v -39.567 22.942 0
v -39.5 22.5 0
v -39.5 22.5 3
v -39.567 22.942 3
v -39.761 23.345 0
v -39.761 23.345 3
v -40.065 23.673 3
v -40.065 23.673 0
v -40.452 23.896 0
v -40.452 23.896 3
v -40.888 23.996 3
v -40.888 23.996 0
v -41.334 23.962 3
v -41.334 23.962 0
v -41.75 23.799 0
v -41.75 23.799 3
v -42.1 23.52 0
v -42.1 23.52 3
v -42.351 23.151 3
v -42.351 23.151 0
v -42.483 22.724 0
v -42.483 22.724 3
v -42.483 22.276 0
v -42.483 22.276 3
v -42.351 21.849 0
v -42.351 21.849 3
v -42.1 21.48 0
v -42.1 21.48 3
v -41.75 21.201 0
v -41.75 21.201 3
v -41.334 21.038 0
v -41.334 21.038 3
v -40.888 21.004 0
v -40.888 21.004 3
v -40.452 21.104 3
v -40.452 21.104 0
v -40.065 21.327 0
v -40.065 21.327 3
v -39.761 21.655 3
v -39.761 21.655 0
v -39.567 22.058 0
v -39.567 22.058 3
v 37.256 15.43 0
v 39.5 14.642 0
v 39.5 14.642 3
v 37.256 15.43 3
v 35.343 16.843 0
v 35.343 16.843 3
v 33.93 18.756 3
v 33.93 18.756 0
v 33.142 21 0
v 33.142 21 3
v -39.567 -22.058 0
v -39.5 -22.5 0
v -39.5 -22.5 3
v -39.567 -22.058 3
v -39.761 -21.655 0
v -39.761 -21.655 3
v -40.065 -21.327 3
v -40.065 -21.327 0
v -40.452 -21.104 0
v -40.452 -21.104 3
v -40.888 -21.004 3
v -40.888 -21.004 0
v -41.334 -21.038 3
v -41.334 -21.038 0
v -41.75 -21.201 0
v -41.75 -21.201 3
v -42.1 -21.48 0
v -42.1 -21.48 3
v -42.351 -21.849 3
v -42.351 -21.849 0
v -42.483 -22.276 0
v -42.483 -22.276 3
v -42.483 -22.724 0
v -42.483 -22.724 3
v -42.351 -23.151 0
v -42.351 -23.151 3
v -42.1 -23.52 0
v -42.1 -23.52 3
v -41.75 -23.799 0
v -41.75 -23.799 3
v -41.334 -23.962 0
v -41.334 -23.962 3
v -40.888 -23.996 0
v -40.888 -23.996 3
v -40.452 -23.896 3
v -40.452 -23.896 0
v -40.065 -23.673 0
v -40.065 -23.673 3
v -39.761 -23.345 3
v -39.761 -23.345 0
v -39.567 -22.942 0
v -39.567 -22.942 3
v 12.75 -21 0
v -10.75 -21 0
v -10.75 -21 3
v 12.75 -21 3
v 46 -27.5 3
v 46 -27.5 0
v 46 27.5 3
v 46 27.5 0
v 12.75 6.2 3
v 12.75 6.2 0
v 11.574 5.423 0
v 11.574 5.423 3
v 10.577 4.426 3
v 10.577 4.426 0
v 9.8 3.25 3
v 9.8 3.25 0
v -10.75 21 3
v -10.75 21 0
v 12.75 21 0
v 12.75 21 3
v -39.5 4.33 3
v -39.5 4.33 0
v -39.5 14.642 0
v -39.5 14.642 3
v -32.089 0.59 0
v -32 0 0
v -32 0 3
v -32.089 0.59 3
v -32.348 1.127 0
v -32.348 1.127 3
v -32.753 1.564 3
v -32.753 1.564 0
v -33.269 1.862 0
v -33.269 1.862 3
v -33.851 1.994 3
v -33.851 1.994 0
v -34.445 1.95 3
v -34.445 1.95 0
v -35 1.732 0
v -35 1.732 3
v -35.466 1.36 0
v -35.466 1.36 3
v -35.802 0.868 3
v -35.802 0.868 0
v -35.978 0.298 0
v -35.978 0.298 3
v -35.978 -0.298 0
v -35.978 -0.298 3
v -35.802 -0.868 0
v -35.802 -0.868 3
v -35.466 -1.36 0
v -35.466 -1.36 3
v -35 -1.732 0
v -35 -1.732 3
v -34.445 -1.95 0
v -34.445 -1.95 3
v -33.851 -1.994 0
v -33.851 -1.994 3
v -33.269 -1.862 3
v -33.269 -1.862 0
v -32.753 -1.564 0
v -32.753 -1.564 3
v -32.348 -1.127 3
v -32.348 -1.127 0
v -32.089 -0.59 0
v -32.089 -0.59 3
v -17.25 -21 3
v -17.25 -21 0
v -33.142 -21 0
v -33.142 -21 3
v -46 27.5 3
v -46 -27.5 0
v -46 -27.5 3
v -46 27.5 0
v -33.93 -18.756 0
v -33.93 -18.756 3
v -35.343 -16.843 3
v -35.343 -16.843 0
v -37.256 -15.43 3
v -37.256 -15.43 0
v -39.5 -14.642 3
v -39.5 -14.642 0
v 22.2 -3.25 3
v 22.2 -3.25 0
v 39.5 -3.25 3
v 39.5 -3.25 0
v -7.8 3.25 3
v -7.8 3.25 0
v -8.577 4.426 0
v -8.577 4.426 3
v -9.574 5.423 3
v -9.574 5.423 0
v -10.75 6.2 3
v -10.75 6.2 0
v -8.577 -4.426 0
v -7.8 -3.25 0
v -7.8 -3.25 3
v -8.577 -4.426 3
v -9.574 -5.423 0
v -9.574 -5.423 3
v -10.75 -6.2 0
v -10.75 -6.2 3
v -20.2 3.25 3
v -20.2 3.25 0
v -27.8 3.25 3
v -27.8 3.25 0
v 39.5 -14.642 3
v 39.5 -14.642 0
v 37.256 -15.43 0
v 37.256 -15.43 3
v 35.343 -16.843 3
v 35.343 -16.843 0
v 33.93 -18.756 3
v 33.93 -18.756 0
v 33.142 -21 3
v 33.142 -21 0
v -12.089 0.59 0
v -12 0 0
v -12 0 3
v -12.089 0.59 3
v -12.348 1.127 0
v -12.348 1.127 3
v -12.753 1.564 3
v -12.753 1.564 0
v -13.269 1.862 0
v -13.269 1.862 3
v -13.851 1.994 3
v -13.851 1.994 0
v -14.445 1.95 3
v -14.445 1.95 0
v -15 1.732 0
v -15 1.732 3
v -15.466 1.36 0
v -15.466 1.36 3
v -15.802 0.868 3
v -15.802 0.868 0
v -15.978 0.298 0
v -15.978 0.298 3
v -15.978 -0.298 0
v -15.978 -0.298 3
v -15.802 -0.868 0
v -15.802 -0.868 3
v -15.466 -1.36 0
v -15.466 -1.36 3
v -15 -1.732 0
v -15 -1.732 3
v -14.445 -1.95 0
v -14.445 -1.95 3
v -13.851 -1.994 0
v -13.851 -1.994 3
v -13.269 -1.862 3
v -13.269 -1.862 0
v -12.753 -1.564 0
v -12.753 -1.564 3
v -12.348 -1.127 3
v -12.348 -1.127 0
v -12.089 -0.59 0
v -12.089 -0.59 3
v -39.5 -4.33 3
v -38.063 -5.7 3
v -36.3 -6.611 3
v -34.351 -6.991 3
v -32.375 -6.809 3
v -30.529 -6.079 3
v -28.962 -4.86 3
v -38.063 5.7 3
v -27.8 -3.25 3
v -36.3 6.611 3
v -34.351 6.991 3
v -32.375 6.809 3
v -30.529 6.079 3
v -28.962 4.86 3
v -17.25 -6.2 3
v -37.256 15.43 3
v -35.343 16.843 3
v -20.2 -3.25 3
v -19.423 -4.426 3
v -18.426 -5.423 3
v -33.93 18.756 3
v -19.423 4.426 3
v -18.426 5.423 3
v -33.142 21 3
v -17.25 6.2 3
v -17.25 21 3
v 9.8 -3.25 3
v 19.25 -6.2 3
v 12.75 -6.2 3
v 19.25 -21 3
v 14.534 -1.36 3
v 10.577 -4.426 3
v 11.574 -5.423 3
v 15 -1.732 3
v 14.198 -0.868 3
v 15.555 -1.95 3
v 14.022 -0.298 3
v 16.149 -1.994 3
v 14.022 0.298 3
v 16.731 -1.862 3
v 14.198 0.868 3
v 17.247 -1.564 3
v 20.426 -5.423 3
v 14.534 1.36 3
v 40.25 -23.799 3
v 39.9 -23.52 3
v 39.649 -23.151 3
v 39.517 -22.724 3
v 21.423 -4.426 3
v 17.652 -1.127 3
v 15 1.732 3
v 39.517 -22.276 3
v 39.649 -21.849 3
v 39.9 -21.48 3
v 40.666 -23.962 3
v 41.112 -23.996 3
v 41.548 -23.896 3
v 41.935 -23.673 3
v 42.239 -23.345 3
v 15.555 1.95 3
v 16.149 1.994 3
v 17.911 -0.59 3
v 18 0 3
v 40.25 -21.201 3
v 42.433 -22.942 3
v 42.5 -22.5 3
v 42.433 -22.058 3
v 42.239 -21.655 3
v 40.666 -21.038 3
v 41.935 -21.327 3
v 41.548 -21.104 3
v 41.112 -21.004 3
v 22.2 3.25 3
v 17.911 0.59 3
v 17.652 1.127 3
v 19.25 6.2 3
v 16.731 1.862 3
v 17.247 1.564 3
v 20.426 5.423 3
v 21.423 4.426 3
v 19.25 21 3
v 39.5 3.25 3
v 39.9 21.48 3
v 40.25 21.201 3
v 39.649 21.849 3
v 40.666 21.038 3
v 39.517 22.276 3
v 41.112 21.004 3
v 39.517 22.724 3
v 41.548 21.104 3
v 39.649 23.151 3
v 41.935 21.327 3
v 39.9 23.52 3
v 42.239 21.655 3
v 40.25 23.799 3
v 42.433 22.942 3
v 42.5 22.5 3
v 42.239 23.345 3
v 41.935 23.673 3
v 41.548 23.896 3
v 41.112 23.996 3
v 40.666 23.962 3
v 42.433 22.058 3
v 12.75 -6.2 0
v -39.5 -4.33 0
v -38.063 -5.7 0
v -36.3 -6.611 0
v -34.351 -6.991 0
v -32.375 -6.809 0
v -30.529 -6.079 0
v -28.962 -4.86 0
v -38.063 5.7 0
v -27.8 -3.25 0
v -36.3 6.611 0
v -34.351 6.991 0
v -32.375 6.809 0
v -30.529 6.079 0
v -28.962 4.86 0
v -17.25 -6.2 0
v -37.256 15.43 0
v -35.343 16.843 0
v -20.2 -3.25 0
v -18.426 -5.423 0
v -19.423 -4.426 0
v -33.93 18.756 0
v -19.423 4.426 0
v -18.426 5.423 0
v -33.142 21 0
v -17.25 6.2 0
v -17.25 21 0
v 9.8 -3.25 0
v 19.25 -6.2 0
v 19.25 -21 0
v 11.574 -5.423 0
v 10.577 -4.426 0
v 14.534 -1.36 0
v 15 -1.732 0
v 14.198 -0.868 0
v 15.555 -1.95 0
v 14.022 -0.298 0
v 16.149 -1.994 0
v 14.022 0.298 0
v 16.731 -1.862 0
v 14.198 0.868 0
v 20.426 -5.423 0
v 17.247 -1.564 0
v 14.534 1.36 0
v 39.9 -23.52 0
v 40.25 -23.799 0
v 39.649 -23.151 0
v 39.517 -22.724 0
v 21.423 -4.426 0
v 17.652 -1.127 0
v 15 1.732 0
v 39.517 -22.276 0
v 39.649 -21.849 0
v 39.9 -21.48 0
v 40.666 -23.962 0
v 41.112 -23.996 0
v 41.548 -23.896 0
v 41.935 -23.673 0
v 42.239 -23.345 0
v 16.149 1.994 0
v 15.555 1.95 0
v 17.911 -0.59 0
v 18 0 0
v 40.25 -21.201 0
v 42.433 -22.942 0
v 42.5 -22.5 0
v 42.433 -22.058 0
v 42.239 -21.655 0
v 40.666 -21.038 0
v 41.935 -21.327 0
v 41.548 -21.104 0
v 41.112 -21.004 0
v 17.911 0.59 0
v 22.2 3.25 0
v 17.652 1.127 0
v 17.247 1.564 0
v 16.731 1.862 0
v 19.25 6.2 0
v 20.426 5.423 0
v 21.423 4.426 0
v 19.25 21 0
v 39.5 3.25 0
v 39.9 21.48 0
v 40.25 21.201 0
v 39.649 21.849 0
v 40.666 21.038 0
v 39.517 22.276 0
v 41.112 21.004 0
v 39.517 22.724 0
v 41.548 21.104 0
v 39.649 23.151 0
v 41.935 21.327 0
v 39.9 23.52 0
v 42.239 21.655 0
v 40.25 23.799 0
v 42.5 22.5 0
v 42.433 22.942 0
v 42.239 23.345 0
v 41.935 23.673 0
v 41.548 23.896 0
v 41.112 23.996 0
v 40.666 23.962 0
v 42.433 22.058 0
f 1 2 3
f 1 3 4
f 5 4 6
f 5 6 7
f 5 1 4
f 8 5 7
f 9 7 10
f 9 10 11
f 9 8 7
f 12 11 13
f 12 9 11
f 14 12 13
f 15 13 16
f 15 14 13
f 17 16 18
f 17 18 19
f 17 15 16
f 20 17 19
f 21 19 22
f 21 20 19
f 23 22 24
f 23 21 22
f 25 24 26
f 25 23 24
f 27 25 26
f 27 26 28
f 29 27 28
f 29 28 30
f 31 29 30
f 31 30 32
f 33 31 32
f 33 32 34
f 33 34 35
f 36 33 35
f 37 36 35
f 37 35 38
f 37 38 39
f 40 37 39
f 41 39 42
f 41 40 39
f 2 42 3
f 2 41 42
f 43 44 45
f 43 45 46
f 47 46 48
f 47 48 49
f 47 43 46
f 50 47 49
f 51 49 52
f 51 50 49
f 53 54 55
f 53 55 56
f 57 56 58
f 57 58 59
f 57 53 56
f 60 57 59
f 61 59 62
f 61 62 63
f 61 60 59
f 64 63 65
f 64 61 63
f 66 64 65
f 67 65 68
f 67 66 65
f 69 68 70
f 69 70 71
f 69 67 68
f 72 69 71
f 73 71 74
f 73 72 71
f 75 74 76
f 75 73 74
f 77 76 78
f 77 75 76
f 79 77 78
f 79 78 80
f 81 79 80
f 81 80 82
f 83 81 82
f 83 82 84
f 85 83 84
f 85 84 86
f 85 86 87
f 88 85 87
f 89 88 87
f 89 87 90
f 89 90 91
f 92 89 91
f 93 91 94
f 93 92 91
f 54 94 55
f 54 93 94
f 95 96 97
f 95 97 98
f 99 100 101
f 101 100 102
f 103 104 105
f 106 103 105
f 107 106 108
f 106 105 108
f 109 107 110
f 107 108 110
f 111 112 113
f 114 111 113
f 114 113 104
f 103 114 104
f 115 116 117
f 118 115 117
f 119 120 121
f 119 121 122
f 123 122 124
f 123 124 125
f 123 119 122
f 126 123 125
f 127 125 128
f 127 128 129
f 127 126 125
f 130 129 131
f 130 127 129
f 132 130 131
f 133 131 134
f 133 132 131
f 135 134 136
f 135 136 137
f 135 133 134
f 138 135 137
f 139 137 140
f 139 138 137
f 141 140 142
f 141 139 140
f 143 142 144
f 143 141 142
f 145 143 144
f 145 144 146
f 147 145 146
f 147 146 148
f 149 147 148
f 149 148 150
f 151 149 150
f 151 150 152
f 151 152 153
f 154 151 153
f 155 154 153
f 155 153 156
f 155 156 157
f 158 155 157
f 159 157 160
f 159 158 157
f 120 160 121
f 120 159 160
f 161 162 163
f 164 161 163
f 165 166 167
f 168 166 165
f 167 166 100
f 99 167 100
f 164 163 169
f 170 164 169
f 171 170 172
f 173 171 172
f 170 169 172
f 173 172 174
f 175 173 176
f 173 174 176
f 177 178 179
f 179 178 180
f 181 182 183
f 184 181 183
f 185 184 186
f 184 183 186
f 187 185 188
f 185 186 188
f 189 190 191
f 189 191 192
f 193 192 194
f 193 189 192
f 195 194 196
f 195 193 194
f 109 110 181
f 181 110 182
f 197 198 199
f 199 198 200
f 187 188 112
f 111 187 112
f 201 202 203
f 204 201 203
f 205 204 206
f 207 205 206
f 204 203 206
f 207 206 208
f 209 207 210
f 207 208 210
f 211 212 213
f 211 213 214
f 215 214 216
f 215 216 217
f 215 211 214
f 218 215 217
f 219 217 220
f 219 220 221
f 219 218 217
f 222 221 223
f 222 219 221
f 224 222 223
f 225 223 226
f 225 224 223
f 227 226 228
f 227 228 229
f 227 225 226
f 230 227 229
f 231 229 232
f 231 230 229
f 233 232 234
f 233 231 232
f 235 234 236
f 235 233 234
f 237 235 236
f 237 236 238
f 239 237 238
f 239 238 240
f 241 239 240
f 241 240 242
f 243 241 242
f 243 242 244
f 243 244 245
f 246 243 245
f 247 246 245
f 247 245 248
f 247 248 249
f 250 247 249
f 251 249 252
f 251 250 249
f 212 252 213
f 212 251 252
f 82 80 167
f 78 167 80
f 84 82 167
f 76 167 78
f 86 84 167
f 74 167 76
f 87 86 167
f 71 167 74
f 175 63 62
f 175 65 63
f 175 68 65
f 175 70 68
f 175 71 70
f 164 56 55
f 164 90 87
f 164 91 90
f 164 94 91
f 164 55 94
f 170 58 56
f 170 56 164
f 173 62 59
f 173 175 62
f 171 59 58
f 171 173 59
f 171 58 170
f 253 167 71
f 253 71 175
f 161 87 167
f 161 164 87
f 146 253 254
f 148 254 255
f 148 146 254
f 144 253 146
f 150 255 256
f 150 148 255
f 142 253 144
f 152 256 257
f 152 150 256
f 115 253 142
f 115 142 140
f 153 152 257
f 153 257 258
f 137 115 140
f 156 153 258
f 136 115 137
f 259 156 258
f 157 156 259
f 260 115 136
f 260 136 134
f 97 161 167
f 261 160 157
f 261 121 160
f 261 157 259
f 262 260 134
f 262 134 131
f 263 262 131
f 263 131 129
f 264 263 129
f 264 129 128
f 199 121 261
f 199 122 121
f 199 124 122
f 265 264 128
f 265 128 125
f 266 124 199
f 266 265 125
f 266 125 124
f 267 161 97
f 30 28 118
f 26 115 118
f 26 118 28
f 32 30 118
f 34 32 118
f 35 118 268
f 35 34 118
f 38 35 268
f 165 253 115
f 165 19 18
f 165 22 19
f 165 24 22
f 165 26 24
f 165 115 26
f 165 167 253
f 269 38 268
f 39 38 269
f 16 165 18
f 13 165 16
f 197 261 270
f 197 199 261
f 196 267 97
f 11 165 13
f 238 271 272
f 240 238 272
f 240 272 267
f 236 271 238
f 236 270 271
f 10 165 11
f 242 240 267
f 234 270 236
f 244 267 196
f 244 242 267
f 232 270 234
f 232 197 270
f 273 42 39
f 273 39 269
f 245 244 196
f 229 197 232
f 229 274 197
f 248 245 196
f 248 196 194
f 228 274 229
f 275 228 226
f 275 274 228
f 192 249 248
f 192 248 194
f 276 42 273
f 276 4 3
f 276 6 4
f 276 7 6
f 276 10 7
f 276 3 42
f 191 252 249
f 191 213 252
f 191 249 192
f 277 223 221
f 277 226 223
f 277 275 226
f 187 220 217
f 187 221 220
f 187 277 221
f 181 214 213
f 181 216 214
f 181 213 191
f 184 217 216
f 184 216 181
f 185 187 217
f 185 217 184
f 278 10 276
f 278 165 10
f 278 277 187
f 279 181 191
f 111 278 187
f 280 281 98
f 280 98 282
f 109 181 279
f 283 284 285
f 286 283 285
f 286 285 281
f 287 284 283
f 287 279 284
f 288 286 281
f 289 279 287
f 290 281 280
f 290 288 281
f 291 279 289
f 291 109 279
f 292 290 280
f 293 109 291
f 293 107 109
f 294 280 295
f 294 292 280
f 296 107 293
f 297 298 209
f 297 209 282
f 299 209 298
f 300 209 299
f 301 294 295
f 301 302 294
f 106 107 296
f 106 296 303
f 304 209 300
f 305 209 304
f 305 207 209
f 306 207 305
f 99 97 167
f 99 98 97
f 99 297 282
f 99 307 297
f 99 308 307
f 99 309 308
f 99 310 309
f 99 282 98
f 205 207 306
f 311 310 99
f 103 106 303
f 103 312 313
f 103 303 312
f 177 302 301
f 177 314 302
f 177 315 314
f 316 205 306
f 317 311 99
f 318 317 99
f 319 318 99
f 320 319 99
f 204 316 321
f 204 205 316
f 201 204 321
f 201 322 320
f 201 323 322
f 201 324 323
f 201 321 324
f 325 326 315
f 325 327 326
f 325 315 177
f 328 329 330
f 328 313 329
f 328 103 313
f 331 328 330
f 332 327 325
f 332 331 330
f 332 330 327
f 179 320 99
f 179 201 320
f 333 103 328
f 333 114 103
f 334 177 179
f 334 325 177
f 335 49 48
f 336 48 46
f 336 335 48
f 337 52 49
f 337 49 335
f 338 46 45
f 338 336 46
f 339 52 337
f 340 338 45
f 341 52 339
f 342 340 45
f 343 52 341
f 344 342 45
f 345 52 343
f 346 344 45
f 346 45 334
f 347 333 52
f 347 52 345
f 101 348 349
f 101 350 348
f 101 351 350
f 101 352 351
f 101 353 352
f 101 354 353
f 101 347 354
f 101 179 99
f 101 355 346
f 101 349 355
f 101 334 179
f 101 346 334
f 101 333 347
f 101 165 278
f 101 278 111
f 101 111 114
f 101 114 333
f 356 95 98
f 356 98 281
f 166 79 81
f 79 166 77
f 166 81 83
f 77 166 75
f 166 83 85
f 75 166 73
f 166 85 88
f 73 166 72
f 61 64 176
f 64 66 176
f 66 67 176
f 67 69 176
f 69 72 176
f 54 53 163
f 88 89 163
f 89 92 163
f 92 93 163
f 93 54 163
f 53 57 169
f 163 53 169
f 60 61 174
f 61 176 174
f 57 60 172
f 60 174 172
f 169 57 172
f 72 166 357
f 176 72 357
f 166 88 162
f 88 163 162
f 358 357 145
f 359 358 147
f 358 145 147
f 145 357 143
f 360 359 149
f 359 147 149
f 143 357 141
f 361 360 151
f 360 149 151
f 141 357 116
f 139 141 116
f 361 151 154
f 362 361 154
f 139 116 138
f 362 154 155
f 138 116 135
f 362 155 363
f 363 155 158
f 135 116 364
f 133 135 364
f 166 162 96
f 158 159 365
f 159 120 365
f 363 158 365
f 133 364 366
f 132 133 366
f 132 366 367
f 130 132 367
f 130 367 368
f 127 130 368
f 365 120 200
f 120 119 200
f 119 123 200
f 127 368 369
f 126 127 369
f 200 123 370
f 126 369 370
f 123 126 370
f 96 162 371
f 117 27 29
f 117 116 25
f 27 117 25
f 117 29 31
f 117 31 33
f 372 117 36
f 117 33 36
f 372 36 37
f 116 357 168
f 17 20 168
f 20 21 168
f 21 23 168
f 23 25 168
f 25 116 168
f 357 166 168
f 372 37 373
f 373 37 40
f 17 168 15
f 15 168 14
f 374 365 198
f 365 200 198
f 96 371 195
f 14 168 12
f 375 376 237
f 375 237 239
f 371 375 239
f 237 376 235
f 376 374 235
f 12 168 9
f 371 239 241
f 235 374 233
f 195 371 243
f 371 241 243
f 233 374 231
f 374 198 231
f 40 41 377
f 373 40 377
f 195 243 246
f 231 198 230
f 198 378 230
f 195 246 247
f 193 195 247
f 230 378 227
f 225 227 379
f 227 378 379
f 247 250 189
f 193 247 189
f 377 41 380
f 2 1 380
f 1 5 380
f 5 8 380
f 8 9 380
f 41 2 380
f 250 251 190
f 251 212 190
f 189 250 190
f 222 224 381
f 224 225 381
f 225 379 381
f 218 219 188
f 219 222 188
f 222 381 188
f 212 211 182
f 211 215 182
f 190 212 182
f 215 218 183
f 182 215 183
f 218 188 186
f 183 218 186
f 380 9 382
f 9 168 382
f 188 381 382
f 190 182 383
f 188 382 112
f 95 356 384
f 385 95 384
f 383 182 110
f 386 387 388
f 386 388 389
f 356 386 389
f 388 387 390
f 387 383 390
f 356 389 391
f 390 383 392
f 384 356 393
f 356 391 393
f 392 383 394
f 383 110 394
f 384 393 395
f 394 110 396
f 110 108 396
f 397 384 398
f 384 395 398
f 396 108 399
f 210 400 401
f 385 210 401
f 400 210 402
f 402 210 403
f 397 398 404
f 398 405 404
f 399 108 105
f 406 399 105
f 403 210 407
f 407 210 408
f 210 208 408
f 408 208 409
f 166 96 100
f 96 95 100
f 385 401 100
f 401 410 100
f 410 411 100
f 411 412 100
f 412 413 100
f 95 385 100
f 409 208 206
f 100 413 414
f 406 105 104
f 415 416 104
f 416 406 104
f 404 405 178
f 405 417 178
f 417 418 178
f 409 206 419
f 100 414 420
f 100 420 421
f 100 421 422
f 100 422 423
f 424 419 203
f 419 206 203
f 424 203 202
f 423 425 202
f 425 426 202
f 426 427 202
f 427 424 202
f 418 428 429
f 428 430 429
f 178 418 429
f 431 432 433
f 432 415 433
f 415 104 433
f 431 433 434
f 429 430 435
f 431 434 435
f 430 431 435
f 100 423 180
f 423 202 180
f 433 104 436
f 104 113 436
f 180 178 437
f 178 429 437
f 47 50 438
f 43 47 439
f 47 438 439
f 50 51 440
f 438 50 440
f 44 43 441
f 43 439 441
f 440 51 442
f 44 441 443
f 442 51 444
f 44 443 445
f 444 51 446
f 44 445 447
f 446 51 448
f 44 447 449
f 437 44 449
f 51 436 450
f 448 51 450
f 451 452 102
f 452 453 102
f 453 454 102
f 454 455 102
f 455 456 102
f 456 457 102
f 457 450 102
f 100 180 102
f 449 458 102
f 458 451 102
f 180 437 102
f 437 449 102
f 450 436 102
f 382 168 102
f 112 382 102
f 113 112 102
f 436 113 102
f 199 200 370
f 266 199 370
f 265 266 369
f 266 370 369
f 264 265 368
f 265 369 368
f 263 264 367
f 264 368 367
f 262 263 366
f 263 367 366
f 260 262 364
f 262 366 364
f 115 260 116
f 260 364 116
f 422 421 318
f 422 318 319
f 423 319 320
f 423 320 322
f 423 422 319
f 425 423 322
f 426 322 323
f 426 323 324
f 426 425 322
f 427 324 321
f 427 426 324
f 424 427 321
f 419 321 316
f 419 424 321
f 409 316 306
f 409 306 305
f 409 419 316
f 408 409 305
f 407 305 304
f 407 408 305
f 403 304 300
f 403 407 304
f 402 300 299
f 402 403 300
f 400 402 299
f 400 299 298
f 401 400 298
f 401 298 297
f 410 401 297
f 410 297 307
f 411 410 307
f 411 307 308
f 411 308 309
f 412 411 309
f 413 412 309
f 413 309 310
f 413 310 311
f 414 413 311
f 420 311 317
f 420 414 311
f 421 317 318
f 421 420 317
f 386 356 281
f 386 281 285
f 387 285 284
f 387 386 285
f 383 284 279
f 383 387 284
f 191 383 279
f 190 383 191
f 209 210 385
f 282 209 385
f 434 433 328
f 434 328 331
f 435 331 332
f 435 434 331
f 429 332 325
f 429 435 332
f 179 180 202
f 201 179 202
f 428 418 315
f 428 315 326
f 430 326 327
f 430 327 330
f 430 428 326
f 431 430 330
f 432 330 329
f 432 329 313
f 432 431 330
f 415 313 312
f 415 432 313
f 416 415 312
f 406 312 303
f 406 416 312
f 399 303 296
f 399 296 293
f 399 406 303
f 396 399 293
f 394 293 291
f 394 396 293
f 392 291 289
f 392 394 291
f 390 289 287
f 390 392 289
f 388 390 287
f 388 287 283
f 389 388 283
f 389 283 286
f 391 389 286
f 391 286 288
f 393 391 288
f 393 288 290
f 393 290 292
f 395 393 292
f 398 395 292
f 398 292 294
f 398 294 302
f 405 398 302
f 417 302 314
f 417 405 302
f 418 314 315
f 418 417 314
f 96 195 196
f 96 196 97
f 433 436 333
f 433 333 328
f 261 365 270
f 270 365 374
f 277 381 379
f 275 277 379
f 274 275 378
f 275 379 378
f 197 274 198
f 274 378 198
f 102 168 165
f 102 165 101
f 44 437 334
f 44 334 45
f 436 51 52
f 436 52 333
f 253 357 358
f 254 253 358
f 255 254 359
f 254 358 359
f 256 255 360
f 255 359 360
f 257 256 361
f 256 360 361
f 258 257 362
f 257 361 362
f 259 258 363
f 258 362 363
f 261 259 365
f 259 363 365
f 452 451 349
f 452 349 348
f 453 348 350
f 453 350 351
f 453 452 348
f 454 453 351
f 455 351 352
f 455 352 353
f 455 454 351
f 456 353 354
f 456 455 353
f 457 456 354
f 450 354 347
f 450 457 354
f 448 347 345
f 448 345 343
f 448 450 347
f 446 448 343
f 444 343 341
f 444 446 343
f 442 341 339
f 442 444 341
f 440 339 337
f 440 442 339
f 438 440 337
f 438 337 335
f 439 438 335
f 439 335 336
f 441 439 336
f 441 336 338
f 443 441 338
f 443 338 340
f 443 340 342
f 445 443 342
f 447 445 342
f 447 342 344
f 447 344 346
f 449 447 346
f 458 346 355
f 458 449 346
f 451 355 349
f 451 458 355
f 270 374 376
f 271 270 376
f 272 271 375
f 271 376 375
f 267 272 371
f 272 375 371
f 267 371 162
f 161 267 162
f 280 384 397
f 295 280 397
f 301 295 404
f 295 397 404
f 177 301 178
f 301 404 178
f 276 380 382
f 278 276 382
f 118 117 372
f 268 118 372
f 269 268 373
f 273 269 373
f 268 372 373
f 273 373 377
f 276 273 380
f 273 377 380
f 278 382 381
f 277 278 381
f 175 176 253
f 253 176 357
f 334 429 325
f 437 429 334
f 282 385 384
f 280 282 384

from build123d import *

# Parameters (mm, degrees)
SKETCH1_W           = 92
SKETCH1_H           = 55
SKETCH1_R           = 2
SKETCH1_R_2         = 1.5
BOSS_EXTRUDE1_DEPTH = 3


with BuildPart() as part:
    # Sketch1 → Boss-Extrude1 (new body)
    with BuildSketch(Plane.XY):
        Rectangle(SKETCH1_W, SKETCH1_H)
        with Locations((-34, 0)):
            Circle(SKETCH1_R, mode=Mode.SUBTRACT)
        with Locations((-14, 0)):
            Circle(SKETCH1_R, mode=Mode.SUBTRACT)
        with Locations((16, 0)):
            Circle(SKETCH1_R, mode=Mode.SUBTRACT)
        with Locations((-41, 22.5)):
            Circle(SKETCH1_R_2, mode=Mode.SUBTRACT)
        with Locations((41, 22.5)):
            Circle(SKETCH1_R_2, mode=Mode.SUBTRACT)
        with Locations((41, -22.5)):
            Circle(SKETCH1_R_2, mode=Mode.SUBTRACT)
        with Locations((-41, -22.5)):
            Circle(SKETCH1_R_2, mode=Mode.SUBTRACT)
        with BuildLine():
            Line((12.75, -21), (12.75, -6.199798384))
            ThreePointArc((12.75, -6.199798384), (11.050252532, -4.949747468), (9.800201616, -3.25))
            Line((9.800201616, -3.25), (-7.800201616, -3.25))
            ThreePointArc((-7.800201616, -3.25), (-9.050252532, -4.949747468), (-10.75, -6.199798384))
            Line((-10.75, -6.199798384), (-10.75, -21))
            Line((-10.75, -21), (12.75, -21))
        make_face(mode=Mode.SUBTRACT)
        with BuildLine():
            Line((-39.5, 4.330127019), (-39.5, 14.641883177))
            ThreePointArc((-39.5, 14.641883177), (-35.343145751, 16.843145751), (-33.141883177, 21))
            Line((-33.141883177, 21), (-17.25, 21))
            Line((-17.25, 21), (-17.25, 6.199798384))
            ThreePointArc((-17.25, 6.199798384), (-18.949747468, 4.949747468), (-20.199798384, 3.25))
            Line((-20.199798384, 3.25), (-27.800201616, 3.25))
            ThreePointArc((-27.800201616, 3.25), (-33.356495502, 6.970358812), (-39.5, 4.330127019))
        make_face(mode=Mode.SUBTRACT)
        with BuildLine():
            Line((-27.800201616, -3.25), (-20.199798384, -3.25))
            ThreePointArc((-20.199798384, -3.25), (-18.949747468, -4.949747468), (-17.25, -6.199798384))
            Line((-17.25, -6.199798384), (-17.25, -21))
            Line((-17.25, -21), (-33.141883177, -21))
            ThreePointArc((-33.141883177, -21), (-35.343145751, -16.843145751), (-39.5, -14.641883177))
            Line((-39.5, -14.641883177), (-39.5, -4.330127019))
            ThreePointArc((-39.5, -4.330127019), (-33.356495502, -6.970358812), (-27.800201616, -3.25))
        make_face(mode=Mode.SUBTRACT)
        with BuildLine():
            Line((19.25, -21), (19.25, -6.199798384))
            ThreePointArc((19.25, -6.199798384), (20.949747468, -4.949747468), (22.199798384, -3.25))
            Line((22.199798384, -3.25), (39.5, -3.25))
            Line((39.5, -3.25), (39.5, -14.641883177))
            ThreePointArc((39.5, -14.641883177), (35.343145751, -16.843145751), (33.141883177, -21))
            Line((33.141883177, -21), (19.25, -21))
        make_face(mode=Mode.SUBTRACT)
        with BuildLine():
            Line((39.5, 3.25), (39.5, 14.641883177))
            ThreePointArc((39.5, 14.641883177), (35.343145751, 16.843145751), (33.141883177, 21))
            Line((33.141883177, 21), (19.25, 21))
            Line((19.25, 21), (19.25, 6.199798384))
            ThreePointArc((19.25, 6.199798384), (20.949747468, 4.949747468), (22.199798384, 3.25))
            Line((22.199798384, 3.25), (39.5, 3.25))
        make_face(mode=Mode.SUBTRACT)
        with BuildLine():
            Line((-10.75, 21), (12.75, 21))
            Line((12.75, 21), (12.75, 6.199798384))
            ThreePointArc((12.75, 6.199798384), (11.050252532, 4.949747468), (9.800201616, 3.25))
            Line((9.800201616, 3.25), (-7.800201616, 3.25))
            ThreePointArc((-7.800201616, 3.25), (-9.050252532, 4.949747468), (-10.75, 6.199798384))
            Line((-10.75, 6.199798384), (-10.75, 21))
        make_face(mode=Mode.SUBTRACT)
    extrude(amount=BOSS_EXTRUDE1_DEPTH)


solid = part.part
